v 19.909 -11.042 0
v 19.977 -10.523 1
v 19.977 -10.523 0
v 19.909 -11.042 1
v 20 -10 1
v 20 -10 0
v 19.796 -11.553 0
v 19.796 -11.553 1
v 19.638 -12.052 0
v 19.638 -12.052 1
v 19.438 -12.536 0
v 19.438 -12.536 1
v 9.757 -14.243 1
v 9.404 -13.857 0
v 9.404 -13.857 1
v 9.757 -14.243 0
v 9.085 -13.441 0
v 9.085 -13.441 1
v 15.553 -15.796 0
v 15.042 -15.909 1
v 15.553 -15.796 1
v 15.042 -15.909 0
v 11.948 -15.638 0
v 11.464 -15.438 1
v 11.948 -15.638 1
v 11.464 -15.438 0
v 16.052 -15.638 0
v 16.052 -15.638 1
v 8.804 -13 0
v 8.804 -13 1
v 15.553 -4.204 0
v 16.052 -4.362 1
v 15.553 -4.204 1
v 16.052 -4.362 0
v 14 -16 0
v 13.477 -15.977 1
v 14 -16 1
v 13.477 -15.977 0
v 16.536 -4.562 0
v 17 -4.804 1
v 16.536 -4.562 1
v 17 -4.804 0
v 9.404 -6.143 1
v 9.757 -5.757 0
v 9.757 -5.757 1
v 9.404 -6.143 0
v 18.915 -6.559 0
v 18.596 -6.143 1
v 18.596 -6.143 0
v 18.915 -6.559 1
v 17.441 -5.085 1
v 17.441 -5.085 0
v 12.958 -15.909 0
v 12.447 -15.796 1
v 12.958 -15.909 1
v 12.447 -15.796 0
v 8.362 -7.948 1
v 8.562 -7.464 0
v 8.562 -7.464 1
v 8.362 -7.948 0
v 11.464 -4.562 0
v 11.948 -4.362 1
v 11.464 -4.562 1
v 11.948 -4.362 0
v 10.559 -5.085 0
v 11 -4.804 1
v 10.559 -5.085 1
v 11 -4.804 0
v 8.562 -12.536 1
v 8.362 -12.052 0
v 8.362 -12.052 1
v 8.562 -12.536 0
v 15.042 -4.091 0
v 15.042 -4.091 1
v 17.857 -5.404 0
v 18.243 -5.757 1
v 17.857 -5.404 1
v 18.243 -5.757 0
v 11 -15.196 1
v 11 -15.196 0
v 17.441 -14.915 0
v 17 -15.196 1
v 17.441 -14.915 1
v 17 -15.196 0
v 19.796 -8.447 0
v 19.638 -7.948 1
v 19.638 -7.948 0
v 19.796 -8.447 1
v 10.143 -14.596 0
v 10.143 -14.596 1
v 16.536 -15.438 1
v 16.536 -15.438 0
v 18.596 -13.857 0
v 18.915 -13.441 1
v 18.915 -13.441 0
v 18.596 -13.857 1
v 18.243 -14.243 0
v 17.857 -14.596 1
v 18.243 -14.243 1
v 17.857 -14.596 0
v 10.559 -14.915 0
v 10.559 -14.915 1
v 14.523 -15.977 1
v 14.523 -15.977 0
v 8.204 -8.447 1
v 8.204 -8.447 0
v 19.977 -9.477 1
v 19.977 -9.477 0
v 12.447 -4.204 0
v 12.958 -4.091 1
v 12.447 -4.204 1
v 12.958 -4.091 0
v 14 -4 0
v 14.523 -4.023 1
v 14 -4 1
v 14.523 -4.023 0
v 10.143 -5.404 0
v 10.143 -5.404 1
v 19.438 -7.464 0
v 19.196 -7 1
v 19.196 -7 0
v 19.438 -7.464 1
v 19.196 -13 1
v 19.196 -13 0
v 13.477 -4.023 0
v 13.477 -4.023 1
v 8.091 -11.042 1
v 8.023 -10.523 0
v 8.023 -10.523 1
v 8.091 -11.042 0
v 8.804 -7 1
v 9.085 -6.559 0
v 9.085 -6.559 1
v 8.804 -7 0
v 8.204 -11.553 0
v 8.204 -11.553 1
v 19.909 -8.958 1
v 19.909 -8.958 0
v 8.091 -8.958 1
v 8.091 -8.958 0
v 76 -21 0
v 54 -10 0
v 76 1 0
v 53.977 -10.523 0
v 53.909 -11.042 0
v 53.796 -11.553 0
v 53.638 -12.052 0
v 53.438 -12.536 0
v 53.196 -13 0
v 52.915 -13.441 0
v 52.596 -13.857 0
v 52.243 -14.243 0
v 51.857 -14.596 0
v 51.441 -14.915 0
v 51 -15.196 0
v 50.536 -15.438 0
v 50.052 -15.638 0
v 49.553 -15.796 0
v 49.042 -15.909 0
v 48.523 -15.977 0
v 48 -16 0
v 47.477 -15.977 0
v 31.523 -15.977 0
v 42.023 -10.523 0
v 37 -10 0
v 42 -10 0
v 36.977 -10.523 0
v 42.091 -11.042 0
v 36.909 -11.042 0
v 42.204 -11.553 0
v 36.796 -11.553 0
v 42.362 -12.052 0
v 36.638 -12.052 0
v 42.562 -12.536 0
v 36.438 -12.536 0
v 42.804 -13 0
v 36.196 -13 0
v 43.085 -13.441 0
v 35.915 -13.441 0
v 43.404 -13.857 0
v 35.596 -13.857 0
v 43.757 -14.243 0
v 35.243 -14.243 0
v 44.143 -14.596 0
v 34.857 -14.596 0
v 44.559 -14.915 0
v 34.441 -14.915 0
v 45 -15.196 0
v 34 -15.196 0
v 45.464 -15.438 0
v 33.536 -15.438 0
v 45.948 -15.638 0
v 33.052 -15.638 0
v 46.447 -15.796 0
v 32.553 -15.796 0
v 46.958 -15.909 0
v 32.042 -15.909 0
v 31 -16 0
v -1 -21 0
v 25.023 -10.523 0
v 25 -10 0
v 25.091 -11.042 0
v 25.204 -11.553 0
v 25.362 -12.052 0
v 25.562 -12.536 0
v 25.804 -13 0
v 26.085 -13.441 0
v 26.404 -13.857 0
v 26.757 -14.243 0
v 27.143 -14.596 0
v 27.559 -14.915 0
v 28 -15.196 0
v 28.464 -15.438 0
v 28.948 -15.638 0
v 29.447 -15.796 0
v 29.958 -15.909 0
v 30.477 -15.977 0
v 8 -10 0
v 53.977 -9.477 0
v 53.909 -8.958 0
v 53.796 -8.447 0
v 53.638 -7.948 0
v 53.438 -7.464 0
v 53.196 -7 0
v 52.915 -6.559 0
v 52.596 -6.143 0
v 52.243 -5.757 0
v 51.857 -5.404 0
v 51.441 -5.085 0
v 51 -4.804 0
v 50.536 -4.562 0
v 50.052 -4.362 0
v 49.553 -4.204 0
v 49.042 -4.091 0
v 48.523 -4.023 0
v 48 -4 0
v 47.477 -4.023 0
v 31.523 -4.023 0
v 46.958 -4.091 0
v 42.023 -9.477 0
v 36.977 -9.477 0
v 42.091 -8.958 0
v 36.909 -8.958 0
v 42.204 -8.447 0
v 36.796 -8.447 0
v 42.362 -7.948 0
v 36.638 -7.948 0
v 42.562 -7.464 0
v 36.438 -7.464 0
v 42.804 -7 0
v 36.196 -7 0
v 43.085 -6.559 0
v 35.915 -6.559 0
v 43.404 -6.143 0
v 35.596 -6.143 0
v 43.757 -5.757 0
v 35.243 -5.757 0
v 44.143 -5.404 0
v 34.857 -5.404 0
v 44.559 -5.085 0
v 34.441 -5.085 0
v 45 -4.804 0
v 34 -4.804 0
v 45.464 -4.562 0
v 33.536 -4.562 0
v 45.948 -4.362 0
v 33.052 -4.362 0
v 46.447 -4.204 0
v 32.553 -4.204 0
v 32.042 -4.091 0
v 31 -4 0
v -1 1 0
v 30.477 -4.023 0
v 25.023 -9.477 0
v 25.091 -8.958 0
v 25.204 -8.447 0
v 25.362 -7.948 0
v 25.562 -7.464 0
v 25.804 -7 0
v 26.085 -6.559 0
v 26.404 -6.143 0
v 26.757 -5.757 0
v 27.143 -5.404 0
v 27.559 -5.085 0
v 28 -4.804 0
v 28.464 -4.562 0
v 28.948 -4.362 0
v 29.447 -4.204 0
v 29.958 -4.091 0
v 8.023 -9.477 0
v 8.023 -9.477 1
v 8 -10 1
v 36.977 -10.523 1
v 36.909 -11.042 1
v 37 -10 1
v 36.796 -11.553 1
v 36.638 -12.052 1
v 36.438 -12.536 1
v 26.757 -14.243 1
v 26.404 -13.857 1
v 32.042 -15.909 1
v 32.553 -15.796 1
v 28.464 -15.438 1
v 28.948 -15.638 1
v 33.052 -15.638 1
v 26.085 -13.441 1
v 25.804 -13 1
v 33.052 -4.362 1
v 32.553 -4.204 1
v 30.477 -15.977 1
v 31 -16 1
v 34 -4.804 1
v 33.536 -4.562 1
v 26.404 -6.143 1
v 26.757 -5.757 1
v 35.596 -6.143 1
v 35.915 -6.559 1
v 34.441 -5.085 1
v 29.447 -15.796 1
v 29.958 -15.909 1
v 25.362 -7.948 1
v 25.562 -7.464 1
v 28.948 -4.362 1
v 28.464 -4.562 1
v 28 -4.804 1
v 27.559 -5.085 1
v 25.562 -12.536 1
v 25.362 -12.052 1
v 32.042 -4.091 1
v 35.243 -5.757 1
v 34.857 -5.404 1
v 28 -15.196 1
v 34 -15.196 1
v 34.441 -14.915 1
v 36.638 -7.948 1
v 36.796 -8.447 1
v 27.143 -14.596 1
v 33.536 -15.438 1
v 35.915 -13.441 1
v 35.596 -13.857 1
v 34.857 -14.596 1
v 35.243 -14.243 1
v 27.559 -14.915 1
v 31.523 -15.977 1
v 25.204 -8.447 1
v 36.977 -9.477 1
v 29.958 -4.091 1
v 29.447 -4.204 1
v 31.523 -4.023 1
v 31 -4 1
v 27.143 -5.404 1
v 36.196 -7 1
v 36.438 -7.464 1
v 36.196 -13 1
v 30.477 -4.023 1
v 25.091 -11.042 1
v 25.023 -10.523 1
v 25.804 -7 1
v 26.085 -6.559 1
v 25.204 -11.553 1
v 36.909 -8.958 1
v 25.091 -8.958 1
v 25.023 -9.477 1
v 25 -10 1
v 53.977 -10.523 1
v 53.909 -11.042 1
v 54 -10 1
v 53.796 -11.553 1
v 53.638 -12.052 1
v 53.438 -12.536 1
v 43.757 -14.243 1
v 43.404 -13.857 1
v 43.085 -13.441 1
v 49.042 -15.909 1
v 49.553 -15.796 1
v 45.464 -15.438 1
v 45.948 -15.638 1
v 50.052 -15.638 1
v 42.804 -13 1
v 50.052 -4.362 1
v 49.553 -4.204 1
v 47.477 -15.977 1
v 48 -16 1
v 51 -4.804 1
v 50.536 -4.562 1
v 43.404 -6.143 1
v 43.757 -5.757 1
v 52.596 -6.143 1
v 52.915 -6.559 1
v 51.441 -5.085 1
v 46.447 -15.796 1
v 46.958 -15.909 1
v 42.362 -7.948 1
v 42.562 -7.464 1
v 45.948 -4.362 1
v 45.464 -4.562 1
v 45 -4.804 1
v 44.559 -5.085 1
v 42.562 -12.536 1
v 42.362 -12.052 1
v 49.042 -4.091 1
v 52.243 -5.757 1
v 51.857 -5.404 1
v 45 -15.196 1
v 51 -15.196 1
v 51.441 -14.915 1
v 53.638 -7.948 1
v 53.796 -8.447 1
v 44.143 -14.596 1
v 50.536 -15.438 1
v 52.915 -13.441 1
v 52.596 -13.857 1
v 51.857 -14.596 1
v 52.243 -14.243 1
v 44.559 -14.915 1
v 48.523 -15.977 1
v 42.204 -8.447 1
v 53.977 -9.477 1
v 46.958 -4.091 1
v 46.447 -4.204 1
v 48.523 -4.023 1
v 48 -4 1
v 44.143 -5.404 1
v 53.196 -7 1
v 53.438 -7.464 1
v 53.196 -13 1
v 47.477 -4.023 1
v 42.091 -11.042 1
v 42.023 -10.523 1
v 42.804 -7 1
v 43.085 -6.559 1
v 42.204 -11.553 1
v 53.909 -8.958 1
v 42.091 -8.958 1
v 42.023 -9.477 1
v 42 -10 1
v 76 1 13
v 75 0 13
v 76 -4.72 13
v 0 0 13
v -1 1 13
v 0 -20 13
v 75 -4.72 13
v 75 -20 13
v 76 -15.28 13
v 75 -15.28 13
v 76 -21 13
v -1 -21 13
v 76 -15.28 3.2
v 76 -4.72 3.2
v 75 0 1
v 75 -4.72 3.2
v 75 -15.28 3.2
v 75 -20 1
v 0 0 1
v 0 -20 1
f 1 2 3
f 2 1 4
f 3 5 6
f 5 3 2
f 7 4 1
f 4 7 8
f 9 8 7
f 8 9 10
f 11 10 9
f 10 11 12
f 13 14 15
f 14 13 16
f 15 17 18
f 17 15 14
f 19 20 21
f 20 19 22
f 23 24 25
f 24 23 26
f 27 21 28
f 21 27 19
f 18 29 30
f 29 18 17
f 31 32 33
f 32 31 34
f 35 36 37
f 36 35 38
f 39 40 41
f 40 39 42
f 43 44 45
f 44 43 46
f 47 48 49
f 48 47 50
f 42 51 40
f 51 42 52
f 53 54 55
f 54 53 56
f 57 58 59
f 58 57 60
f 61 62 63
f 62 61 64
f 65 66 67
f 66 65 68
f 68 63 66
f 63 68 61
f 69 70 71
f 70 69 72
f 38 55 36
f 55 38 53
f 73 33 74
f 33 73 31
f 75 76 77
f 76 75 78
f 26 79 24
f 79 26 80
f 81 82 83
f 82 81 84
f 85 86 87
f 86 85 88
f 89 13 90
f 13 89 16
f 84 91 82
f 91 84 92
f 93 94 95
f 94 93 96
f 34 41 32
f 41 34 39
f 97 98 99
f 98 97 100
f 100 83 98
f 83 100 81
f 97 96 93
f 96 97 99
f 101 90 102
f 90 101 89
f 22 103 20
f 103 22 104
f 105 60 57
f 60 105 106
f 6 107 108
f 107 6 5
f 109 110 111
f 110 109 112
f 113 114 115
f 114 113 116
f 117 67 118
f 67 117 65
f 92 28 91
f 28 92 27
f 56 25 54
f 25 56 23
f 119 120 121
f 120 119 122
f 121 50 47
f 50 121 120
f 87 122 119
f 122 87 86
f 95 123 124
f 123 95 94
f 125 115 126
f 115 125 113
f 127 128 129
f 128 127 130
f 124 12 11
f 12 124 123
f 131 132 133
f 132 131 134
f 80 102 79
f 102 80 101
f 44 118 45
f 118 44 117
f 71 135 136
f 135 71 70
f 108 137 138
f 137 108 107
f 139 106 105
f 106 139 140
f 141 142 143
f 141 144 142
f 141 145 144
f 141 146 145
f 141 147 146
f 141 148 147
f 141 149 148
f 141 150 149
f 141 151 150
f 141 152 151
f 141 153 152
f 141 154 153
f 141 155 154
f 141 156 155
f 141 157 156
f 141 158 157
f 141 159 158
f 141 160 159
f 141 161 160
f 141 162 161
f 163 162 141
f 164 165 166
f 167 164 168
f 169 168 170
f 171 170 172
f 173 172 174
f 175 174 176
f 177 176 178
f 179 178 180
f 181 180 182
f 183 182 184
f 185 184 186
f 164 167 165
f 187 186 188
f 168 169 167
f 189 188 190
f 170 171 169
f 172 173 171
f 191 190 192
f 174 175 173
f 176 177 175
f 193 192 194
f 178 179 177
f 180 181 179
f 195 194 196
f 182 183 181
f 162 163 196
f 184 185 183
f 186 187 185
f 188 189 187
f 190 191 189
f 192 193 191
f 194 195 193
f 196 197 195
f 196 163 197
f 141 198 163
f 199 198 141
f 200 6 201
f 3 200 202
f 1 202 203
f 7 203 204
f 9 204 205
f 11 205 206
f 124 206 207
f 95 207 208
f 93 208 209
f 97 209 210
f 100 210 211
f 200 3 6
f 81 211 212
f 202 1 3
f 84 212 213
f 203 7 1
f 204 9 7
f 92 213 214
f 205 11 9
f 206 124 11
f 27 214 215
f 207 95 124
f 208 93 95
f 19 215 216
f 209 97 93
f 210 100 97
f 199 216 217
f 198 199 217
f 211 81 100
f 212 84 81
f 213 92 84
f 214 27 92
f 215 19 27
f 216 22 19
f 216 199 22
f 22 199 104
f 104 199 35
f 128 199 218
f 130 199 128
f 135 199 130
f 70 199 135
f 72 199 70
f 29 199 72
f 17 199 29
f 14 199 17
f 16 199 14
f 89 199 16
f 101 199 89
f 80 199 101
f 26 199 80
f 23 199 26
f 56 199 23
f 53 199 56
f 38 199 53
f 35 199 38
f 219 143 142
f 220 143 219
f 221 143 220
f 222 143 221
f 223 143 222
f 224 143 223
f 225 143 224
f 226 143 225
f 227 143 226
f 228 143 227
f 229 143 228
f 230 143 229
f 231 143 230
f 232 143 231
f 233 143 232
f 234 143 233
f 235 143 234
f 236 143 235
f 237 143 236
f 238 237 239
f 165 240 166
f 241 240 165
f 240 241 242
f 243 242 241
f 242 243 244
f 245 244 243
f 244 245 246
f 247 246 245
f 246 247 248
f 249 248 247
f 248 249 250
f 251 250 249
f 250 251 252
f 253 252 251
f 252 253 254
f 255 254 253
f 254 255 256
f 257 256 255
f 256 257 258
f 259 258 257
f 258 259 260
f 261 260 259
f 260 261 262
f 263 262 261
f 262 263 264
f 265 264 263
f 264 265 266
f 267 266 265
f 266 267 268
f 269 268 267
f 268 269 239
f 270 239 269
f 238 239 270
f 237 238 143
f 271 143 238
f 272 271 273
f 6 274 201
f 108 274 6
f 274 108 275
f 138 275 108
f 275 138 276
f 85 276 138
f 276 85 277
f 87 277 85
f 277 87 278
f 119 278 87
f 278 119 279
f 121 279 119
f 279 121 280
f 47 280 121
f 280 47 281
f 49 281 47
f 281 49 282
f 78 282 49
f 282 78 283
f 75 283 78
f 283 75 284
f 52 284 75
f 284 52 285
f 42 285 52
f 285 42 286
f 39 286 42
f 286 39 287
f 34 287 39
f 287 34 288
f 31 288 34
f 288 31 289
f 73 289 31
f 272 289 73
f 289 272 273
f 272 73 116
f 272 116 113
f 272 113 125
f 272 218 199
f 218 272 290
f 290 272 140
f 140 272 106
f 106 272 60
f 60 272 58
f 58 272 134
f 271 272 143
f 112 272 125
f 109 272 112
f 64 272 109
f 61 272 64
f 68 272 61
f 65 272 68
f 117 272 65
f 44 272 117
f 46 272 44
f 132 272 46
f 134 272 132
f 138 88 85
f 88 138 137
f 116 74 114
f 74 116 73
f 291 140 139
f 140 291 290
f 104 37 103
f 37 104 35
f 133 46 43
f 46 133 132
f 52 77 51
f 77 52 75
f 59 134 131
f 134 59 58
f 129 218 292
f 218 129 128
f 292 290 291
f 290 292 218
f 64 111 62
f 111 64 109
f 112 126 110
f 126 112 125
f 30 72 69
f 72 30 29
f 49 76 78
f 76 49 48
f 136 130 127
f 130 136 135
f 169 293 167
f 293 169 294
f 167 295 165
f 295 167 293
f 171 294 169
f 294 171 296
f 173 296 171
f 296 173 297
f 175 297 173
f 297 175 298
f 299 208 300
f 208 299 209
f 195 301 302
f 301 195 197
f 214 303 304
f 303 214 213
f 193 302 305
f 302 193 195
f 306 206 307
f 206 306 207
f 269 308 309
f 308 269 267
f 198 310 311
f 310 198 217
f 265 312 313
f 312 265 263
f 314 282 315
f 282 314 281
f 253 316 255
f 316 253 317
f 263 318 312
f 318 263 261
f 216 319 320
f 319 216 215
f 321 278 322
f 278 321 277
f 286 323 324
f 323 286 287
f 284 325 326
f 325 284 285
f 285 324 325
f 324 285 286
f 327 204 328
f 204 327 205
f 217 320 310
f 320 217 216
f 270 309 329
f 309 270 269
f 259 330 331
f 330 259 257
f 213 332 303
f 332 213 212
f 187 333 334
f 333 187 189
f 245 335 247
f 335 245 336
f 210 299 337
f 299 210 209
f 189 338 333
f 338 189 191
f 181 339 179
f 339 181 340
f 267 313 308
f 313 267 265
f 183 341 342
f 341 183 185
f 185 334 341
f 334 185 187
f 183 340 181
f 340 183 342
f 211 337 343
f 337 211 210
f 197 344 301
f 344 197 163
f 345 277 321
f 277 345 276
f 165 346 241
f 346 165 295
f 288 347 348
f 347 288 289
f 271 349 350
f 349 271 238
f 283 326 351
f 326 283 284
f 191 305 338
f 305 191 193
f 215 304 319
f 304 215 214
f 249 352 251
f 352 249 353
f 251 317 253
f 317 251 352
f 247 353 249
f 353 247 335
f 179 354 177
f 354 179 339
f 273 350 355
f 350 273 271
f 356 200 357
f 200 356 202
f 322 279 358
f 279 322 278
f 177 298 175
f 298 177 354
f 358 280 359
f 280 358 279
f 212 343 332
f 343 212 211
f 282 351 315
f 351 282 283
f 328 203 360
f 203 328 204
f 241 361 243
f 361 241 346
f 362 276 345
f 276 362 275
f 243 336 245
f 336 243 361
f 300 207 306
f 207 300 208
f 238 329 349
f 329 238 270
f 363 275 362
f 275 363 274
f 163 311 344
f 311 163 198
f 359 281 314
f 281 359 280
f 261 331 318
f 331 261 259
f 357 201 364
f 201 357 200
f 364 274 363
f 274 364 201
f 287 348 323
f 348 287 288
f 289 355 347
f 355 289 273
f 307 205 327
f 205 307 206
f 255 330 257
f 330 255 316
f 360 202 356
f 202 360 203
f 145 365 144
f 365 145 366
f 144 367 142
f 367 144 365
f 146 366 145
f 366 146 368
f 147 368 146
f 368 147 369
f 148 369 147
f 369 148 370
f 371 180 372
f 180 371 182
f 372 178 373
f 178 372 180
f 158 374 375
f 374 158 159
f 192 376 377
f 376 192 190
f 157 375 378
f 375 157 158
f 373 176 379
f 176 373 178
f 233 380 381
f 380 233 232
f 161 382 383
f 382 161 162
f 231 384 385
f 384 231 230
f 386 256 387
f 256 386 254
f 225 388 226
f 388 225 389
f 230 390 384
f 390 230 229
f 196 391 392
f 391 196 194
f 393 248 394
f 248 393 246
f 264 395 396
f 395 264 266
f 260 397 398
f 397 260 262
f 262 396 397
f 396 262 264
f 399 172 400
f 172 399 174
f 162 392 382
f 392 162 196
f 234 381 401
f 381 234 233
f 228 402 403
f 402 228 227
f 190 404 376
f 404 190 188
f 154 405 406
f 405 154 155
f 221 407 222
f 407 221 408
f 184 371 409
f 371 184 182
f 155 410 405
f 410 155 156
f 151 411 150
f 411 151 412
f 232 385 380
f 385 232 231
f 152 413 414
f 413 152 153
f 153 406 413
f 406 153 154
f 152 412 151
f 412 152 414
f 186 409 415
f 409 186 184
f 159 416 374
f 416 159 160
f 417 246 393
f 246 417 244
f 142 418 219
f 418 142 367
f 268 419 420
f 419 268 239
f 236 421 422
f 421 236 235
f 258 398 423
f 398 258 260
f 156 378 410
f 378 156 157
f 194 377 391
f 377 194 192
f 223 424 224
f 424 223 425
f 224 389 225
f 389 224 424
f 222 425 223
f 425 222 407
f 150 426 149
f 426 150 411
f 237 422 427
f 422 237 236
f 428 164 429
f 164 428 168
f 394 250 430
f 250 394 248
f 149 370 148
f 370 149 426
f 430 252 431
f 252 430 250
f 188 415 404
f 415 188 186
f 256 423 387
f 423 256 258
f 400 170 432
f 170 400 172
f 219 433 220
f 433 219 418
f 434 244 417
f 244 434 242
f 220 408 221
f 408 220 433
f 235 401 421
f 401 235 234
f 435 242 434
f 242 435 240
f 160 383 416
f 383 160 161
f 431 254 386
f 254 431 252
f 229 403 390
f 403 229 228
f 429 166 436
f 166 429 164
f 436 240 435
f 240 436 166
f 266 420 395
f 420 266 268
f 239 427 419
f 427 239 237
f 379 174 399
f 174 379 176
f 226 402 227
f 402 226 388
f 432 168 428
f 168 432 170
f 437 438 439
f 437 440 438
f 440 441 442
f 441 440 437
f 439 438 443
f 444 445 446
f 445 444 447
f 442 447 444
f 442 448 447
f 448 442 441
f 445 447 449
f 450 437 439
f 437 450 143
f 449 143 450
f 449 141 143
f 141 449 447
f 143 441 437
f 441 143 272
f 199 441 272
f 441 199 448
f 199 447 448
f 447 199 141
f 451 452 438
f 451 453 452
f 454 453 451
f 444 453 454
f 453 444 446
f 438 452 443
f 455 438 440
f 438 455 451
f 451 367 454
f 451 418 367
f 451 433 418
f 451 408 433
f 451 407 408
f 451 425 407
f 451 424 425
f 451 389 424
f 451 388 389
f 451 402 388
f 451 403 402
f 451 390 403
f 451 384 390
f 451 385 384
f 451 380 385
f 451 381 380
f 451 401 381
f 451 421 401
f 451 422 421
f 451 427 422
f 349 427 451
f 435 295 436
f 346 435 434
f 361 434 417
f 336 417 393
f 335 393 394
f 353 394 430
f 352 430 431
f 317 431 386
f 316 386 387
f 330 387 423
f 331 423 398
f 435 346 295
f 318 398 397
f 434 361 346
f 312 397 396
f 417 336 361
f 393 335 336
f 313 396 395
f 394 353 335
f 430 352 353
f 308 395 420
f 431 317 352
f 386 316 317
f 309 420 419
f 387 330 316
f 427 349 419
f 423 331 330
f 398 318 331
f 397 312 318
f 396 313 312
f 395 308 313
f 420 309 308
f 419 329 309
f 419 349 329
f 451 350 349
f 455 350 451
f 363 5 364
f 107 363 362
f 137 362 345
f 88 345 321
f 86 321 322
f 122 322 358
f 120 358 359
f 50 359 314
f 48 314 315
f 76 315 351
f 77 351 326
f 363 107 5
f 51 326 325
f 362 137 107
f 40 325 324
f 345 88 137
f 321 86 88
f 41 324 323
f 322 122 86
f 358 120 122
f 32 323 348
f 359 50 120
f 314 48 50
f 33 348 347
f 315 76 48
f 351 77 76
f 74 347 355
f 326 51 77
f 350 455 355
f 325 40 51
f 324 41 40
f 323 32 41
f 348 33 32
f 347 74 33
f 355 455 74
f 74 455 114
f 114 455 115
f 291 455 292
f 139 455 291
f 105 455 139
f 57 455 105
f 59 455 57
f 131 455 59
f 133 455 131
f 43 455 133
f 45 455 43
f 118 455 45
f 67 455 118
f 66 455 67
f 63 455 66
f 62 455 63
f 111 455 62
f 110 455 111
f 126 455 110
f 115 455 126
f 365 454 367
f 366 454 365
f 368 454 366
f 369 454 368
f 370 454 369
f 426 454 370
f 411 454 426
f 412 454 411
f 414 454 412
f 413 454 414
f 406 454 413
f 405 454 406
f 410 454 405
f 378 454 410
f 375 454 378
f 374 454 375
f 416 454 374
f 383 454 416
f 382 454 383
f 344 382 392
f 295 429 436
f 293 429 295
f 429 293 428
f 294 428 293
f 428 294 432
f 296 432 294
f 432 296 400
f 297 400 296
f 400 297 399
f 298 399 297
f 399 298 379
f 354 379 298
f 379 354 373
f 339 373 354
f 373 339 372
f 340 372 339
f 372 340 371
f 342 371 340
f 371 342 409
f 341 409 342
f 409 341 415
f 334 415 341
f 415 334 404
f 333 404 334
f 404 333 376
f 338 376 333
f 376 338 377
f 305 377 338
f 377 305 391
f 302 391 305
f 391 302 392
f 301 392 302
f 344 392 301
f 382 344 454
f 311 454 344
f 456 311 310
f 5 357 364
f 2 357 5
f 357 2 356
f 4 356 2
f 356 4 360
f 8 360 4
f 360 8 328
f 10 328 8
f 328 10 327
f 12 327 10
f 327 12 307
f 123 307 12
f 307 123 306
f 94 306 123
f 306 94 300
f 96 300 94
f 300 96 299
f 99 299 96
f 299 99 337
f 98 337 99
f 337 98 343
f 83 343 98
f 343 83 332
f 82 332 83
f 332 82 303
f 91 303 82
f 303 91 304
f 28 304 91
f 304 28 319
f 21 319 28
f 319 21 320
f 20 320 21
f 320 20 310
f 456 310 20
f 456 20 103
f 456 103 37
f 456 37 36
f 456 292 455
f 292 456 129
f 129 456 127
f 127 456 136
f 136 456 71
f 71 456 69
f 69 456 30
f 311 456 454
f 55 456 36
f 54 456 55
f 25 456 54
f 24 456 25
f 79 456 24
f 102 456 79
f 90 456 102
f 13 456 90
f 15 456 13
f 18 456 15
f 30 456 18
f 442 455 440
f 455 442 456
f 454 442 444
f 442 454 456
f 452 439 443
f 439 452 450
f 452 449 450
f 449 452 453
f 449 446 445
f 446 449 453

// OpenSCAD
//!OpenSCAD
CASE_THICKNESS = 1;
CASE_THICKNESS_TOP = 1;

INNER_WIDTH = 75;
INNER_DEPTH = 20;
INNER_HEIGHT = 10;
BOTTOM_PLATE_HEIGHT = 2;
PCB_HEIGHT = 1.6;

CASE_WIDTH = INNER_WIDTH + 2*CASE_THICKNESS;
CASE_DEPTH = INNER_DEPTH + 2*CASE_THICKNESS;
CASE_HEIGHT = BOTTOM_PLATE_HEIGHT + INNER_HEIGHT + CASE_THICKNESS_TOP;

CAVITY_WIDTH = INNER_WIDTH;
CAVITY_DEPTH = INNER_DEPTH;
CAVITY_HEIGHT = BOTTOM_PLATE_HEIGHT + INNER_HEIGHT;

CUTOUT_C_X = INNER_WIDTH + CASE_THICKNESS/2;
CUTOUT_C_Y = INNER_DEPTH / 2;
CUTOUT_C_Z = 0;
CUTOUT_C_WIDTH = CASE_THICKNESS;
CUTOUT_C_DEPTH = 4*2.54 + 2*0.2;
CUTOUT_C_HEIGHT = BOTTOM_PLATE_HEIGHT + PCB_HEIGHT + 6 + 0.2;

HOLE1_X = 14;
HOLE1_Y = INNER_DEPTH / 2;

HOLE2_X = 31;
HOLE2_Y = INNER_DEPTH / 2;

HOLE3_X = 48;
HOLE3_Y = INNER_DEPTH / 2;

HOLE_DIAMETER = 12;


module box(x, y, z, w, d, h) {
  translate([x, y, z])
  linear_extrude(height = h)
  polygon(
    [
      [-w/2, -d/2],
      [+w/2, -d/2],
      [-w/2, +d/2],
      [+w/2, +d/2],
    ],
    [
      [0, 1, 3, 2],  
    ]
  );
}

module outer_shape() {
  translate([-CASE_THICKNESS, -CASE_THICKNESS, 0])
  box(CASE_WIDTH/2, CASE_DEPTH/2, 0, CASE_WIDTH, CASE_DEPTH, CASE_HEIGHT);
}

module cavity() {
  box(CAVITY_WIDTH/2, CAVITY_DEPTH/2, 0, CAVITY_WIDTH, CAVITY_DEPTH, CAVITY_HEIGHT);
}
              
module cutout_connector() {
  box(CUTOUT_C_X, CUTOUT_C_Y, CUTOUT_C_Z, CUTOUT_C_WIDTH, CUTOUT_C_DEPTH, CUTOUT_C_HEIGHT);
}

module hole(height) {
  translate([0, 0, height/2]) cylinder(r=HOLE_DIAMETER/2, h=height, center=true, $fn=72);
}

module holes() {
  translate([HOLE1_X, HOLE1_Y, 0]) hole(CASE_HEIGHT);
  translate([HOLE2_X, HOLE2_Y, 0]) hole(CASE_HEIGHT);
  translate([HOLE3_X, HOLE3_Y, 0]) hole(CASE_HEIGHT);
}

module case_base() {
    difference() {
        outer_shape();
        cavity();
        cutout_connector();
        holes();
    }
}

difference() {    
    rotate([180,0,0]) translate([0, 0, -CASE_HEIGHT]) case_base();
}
